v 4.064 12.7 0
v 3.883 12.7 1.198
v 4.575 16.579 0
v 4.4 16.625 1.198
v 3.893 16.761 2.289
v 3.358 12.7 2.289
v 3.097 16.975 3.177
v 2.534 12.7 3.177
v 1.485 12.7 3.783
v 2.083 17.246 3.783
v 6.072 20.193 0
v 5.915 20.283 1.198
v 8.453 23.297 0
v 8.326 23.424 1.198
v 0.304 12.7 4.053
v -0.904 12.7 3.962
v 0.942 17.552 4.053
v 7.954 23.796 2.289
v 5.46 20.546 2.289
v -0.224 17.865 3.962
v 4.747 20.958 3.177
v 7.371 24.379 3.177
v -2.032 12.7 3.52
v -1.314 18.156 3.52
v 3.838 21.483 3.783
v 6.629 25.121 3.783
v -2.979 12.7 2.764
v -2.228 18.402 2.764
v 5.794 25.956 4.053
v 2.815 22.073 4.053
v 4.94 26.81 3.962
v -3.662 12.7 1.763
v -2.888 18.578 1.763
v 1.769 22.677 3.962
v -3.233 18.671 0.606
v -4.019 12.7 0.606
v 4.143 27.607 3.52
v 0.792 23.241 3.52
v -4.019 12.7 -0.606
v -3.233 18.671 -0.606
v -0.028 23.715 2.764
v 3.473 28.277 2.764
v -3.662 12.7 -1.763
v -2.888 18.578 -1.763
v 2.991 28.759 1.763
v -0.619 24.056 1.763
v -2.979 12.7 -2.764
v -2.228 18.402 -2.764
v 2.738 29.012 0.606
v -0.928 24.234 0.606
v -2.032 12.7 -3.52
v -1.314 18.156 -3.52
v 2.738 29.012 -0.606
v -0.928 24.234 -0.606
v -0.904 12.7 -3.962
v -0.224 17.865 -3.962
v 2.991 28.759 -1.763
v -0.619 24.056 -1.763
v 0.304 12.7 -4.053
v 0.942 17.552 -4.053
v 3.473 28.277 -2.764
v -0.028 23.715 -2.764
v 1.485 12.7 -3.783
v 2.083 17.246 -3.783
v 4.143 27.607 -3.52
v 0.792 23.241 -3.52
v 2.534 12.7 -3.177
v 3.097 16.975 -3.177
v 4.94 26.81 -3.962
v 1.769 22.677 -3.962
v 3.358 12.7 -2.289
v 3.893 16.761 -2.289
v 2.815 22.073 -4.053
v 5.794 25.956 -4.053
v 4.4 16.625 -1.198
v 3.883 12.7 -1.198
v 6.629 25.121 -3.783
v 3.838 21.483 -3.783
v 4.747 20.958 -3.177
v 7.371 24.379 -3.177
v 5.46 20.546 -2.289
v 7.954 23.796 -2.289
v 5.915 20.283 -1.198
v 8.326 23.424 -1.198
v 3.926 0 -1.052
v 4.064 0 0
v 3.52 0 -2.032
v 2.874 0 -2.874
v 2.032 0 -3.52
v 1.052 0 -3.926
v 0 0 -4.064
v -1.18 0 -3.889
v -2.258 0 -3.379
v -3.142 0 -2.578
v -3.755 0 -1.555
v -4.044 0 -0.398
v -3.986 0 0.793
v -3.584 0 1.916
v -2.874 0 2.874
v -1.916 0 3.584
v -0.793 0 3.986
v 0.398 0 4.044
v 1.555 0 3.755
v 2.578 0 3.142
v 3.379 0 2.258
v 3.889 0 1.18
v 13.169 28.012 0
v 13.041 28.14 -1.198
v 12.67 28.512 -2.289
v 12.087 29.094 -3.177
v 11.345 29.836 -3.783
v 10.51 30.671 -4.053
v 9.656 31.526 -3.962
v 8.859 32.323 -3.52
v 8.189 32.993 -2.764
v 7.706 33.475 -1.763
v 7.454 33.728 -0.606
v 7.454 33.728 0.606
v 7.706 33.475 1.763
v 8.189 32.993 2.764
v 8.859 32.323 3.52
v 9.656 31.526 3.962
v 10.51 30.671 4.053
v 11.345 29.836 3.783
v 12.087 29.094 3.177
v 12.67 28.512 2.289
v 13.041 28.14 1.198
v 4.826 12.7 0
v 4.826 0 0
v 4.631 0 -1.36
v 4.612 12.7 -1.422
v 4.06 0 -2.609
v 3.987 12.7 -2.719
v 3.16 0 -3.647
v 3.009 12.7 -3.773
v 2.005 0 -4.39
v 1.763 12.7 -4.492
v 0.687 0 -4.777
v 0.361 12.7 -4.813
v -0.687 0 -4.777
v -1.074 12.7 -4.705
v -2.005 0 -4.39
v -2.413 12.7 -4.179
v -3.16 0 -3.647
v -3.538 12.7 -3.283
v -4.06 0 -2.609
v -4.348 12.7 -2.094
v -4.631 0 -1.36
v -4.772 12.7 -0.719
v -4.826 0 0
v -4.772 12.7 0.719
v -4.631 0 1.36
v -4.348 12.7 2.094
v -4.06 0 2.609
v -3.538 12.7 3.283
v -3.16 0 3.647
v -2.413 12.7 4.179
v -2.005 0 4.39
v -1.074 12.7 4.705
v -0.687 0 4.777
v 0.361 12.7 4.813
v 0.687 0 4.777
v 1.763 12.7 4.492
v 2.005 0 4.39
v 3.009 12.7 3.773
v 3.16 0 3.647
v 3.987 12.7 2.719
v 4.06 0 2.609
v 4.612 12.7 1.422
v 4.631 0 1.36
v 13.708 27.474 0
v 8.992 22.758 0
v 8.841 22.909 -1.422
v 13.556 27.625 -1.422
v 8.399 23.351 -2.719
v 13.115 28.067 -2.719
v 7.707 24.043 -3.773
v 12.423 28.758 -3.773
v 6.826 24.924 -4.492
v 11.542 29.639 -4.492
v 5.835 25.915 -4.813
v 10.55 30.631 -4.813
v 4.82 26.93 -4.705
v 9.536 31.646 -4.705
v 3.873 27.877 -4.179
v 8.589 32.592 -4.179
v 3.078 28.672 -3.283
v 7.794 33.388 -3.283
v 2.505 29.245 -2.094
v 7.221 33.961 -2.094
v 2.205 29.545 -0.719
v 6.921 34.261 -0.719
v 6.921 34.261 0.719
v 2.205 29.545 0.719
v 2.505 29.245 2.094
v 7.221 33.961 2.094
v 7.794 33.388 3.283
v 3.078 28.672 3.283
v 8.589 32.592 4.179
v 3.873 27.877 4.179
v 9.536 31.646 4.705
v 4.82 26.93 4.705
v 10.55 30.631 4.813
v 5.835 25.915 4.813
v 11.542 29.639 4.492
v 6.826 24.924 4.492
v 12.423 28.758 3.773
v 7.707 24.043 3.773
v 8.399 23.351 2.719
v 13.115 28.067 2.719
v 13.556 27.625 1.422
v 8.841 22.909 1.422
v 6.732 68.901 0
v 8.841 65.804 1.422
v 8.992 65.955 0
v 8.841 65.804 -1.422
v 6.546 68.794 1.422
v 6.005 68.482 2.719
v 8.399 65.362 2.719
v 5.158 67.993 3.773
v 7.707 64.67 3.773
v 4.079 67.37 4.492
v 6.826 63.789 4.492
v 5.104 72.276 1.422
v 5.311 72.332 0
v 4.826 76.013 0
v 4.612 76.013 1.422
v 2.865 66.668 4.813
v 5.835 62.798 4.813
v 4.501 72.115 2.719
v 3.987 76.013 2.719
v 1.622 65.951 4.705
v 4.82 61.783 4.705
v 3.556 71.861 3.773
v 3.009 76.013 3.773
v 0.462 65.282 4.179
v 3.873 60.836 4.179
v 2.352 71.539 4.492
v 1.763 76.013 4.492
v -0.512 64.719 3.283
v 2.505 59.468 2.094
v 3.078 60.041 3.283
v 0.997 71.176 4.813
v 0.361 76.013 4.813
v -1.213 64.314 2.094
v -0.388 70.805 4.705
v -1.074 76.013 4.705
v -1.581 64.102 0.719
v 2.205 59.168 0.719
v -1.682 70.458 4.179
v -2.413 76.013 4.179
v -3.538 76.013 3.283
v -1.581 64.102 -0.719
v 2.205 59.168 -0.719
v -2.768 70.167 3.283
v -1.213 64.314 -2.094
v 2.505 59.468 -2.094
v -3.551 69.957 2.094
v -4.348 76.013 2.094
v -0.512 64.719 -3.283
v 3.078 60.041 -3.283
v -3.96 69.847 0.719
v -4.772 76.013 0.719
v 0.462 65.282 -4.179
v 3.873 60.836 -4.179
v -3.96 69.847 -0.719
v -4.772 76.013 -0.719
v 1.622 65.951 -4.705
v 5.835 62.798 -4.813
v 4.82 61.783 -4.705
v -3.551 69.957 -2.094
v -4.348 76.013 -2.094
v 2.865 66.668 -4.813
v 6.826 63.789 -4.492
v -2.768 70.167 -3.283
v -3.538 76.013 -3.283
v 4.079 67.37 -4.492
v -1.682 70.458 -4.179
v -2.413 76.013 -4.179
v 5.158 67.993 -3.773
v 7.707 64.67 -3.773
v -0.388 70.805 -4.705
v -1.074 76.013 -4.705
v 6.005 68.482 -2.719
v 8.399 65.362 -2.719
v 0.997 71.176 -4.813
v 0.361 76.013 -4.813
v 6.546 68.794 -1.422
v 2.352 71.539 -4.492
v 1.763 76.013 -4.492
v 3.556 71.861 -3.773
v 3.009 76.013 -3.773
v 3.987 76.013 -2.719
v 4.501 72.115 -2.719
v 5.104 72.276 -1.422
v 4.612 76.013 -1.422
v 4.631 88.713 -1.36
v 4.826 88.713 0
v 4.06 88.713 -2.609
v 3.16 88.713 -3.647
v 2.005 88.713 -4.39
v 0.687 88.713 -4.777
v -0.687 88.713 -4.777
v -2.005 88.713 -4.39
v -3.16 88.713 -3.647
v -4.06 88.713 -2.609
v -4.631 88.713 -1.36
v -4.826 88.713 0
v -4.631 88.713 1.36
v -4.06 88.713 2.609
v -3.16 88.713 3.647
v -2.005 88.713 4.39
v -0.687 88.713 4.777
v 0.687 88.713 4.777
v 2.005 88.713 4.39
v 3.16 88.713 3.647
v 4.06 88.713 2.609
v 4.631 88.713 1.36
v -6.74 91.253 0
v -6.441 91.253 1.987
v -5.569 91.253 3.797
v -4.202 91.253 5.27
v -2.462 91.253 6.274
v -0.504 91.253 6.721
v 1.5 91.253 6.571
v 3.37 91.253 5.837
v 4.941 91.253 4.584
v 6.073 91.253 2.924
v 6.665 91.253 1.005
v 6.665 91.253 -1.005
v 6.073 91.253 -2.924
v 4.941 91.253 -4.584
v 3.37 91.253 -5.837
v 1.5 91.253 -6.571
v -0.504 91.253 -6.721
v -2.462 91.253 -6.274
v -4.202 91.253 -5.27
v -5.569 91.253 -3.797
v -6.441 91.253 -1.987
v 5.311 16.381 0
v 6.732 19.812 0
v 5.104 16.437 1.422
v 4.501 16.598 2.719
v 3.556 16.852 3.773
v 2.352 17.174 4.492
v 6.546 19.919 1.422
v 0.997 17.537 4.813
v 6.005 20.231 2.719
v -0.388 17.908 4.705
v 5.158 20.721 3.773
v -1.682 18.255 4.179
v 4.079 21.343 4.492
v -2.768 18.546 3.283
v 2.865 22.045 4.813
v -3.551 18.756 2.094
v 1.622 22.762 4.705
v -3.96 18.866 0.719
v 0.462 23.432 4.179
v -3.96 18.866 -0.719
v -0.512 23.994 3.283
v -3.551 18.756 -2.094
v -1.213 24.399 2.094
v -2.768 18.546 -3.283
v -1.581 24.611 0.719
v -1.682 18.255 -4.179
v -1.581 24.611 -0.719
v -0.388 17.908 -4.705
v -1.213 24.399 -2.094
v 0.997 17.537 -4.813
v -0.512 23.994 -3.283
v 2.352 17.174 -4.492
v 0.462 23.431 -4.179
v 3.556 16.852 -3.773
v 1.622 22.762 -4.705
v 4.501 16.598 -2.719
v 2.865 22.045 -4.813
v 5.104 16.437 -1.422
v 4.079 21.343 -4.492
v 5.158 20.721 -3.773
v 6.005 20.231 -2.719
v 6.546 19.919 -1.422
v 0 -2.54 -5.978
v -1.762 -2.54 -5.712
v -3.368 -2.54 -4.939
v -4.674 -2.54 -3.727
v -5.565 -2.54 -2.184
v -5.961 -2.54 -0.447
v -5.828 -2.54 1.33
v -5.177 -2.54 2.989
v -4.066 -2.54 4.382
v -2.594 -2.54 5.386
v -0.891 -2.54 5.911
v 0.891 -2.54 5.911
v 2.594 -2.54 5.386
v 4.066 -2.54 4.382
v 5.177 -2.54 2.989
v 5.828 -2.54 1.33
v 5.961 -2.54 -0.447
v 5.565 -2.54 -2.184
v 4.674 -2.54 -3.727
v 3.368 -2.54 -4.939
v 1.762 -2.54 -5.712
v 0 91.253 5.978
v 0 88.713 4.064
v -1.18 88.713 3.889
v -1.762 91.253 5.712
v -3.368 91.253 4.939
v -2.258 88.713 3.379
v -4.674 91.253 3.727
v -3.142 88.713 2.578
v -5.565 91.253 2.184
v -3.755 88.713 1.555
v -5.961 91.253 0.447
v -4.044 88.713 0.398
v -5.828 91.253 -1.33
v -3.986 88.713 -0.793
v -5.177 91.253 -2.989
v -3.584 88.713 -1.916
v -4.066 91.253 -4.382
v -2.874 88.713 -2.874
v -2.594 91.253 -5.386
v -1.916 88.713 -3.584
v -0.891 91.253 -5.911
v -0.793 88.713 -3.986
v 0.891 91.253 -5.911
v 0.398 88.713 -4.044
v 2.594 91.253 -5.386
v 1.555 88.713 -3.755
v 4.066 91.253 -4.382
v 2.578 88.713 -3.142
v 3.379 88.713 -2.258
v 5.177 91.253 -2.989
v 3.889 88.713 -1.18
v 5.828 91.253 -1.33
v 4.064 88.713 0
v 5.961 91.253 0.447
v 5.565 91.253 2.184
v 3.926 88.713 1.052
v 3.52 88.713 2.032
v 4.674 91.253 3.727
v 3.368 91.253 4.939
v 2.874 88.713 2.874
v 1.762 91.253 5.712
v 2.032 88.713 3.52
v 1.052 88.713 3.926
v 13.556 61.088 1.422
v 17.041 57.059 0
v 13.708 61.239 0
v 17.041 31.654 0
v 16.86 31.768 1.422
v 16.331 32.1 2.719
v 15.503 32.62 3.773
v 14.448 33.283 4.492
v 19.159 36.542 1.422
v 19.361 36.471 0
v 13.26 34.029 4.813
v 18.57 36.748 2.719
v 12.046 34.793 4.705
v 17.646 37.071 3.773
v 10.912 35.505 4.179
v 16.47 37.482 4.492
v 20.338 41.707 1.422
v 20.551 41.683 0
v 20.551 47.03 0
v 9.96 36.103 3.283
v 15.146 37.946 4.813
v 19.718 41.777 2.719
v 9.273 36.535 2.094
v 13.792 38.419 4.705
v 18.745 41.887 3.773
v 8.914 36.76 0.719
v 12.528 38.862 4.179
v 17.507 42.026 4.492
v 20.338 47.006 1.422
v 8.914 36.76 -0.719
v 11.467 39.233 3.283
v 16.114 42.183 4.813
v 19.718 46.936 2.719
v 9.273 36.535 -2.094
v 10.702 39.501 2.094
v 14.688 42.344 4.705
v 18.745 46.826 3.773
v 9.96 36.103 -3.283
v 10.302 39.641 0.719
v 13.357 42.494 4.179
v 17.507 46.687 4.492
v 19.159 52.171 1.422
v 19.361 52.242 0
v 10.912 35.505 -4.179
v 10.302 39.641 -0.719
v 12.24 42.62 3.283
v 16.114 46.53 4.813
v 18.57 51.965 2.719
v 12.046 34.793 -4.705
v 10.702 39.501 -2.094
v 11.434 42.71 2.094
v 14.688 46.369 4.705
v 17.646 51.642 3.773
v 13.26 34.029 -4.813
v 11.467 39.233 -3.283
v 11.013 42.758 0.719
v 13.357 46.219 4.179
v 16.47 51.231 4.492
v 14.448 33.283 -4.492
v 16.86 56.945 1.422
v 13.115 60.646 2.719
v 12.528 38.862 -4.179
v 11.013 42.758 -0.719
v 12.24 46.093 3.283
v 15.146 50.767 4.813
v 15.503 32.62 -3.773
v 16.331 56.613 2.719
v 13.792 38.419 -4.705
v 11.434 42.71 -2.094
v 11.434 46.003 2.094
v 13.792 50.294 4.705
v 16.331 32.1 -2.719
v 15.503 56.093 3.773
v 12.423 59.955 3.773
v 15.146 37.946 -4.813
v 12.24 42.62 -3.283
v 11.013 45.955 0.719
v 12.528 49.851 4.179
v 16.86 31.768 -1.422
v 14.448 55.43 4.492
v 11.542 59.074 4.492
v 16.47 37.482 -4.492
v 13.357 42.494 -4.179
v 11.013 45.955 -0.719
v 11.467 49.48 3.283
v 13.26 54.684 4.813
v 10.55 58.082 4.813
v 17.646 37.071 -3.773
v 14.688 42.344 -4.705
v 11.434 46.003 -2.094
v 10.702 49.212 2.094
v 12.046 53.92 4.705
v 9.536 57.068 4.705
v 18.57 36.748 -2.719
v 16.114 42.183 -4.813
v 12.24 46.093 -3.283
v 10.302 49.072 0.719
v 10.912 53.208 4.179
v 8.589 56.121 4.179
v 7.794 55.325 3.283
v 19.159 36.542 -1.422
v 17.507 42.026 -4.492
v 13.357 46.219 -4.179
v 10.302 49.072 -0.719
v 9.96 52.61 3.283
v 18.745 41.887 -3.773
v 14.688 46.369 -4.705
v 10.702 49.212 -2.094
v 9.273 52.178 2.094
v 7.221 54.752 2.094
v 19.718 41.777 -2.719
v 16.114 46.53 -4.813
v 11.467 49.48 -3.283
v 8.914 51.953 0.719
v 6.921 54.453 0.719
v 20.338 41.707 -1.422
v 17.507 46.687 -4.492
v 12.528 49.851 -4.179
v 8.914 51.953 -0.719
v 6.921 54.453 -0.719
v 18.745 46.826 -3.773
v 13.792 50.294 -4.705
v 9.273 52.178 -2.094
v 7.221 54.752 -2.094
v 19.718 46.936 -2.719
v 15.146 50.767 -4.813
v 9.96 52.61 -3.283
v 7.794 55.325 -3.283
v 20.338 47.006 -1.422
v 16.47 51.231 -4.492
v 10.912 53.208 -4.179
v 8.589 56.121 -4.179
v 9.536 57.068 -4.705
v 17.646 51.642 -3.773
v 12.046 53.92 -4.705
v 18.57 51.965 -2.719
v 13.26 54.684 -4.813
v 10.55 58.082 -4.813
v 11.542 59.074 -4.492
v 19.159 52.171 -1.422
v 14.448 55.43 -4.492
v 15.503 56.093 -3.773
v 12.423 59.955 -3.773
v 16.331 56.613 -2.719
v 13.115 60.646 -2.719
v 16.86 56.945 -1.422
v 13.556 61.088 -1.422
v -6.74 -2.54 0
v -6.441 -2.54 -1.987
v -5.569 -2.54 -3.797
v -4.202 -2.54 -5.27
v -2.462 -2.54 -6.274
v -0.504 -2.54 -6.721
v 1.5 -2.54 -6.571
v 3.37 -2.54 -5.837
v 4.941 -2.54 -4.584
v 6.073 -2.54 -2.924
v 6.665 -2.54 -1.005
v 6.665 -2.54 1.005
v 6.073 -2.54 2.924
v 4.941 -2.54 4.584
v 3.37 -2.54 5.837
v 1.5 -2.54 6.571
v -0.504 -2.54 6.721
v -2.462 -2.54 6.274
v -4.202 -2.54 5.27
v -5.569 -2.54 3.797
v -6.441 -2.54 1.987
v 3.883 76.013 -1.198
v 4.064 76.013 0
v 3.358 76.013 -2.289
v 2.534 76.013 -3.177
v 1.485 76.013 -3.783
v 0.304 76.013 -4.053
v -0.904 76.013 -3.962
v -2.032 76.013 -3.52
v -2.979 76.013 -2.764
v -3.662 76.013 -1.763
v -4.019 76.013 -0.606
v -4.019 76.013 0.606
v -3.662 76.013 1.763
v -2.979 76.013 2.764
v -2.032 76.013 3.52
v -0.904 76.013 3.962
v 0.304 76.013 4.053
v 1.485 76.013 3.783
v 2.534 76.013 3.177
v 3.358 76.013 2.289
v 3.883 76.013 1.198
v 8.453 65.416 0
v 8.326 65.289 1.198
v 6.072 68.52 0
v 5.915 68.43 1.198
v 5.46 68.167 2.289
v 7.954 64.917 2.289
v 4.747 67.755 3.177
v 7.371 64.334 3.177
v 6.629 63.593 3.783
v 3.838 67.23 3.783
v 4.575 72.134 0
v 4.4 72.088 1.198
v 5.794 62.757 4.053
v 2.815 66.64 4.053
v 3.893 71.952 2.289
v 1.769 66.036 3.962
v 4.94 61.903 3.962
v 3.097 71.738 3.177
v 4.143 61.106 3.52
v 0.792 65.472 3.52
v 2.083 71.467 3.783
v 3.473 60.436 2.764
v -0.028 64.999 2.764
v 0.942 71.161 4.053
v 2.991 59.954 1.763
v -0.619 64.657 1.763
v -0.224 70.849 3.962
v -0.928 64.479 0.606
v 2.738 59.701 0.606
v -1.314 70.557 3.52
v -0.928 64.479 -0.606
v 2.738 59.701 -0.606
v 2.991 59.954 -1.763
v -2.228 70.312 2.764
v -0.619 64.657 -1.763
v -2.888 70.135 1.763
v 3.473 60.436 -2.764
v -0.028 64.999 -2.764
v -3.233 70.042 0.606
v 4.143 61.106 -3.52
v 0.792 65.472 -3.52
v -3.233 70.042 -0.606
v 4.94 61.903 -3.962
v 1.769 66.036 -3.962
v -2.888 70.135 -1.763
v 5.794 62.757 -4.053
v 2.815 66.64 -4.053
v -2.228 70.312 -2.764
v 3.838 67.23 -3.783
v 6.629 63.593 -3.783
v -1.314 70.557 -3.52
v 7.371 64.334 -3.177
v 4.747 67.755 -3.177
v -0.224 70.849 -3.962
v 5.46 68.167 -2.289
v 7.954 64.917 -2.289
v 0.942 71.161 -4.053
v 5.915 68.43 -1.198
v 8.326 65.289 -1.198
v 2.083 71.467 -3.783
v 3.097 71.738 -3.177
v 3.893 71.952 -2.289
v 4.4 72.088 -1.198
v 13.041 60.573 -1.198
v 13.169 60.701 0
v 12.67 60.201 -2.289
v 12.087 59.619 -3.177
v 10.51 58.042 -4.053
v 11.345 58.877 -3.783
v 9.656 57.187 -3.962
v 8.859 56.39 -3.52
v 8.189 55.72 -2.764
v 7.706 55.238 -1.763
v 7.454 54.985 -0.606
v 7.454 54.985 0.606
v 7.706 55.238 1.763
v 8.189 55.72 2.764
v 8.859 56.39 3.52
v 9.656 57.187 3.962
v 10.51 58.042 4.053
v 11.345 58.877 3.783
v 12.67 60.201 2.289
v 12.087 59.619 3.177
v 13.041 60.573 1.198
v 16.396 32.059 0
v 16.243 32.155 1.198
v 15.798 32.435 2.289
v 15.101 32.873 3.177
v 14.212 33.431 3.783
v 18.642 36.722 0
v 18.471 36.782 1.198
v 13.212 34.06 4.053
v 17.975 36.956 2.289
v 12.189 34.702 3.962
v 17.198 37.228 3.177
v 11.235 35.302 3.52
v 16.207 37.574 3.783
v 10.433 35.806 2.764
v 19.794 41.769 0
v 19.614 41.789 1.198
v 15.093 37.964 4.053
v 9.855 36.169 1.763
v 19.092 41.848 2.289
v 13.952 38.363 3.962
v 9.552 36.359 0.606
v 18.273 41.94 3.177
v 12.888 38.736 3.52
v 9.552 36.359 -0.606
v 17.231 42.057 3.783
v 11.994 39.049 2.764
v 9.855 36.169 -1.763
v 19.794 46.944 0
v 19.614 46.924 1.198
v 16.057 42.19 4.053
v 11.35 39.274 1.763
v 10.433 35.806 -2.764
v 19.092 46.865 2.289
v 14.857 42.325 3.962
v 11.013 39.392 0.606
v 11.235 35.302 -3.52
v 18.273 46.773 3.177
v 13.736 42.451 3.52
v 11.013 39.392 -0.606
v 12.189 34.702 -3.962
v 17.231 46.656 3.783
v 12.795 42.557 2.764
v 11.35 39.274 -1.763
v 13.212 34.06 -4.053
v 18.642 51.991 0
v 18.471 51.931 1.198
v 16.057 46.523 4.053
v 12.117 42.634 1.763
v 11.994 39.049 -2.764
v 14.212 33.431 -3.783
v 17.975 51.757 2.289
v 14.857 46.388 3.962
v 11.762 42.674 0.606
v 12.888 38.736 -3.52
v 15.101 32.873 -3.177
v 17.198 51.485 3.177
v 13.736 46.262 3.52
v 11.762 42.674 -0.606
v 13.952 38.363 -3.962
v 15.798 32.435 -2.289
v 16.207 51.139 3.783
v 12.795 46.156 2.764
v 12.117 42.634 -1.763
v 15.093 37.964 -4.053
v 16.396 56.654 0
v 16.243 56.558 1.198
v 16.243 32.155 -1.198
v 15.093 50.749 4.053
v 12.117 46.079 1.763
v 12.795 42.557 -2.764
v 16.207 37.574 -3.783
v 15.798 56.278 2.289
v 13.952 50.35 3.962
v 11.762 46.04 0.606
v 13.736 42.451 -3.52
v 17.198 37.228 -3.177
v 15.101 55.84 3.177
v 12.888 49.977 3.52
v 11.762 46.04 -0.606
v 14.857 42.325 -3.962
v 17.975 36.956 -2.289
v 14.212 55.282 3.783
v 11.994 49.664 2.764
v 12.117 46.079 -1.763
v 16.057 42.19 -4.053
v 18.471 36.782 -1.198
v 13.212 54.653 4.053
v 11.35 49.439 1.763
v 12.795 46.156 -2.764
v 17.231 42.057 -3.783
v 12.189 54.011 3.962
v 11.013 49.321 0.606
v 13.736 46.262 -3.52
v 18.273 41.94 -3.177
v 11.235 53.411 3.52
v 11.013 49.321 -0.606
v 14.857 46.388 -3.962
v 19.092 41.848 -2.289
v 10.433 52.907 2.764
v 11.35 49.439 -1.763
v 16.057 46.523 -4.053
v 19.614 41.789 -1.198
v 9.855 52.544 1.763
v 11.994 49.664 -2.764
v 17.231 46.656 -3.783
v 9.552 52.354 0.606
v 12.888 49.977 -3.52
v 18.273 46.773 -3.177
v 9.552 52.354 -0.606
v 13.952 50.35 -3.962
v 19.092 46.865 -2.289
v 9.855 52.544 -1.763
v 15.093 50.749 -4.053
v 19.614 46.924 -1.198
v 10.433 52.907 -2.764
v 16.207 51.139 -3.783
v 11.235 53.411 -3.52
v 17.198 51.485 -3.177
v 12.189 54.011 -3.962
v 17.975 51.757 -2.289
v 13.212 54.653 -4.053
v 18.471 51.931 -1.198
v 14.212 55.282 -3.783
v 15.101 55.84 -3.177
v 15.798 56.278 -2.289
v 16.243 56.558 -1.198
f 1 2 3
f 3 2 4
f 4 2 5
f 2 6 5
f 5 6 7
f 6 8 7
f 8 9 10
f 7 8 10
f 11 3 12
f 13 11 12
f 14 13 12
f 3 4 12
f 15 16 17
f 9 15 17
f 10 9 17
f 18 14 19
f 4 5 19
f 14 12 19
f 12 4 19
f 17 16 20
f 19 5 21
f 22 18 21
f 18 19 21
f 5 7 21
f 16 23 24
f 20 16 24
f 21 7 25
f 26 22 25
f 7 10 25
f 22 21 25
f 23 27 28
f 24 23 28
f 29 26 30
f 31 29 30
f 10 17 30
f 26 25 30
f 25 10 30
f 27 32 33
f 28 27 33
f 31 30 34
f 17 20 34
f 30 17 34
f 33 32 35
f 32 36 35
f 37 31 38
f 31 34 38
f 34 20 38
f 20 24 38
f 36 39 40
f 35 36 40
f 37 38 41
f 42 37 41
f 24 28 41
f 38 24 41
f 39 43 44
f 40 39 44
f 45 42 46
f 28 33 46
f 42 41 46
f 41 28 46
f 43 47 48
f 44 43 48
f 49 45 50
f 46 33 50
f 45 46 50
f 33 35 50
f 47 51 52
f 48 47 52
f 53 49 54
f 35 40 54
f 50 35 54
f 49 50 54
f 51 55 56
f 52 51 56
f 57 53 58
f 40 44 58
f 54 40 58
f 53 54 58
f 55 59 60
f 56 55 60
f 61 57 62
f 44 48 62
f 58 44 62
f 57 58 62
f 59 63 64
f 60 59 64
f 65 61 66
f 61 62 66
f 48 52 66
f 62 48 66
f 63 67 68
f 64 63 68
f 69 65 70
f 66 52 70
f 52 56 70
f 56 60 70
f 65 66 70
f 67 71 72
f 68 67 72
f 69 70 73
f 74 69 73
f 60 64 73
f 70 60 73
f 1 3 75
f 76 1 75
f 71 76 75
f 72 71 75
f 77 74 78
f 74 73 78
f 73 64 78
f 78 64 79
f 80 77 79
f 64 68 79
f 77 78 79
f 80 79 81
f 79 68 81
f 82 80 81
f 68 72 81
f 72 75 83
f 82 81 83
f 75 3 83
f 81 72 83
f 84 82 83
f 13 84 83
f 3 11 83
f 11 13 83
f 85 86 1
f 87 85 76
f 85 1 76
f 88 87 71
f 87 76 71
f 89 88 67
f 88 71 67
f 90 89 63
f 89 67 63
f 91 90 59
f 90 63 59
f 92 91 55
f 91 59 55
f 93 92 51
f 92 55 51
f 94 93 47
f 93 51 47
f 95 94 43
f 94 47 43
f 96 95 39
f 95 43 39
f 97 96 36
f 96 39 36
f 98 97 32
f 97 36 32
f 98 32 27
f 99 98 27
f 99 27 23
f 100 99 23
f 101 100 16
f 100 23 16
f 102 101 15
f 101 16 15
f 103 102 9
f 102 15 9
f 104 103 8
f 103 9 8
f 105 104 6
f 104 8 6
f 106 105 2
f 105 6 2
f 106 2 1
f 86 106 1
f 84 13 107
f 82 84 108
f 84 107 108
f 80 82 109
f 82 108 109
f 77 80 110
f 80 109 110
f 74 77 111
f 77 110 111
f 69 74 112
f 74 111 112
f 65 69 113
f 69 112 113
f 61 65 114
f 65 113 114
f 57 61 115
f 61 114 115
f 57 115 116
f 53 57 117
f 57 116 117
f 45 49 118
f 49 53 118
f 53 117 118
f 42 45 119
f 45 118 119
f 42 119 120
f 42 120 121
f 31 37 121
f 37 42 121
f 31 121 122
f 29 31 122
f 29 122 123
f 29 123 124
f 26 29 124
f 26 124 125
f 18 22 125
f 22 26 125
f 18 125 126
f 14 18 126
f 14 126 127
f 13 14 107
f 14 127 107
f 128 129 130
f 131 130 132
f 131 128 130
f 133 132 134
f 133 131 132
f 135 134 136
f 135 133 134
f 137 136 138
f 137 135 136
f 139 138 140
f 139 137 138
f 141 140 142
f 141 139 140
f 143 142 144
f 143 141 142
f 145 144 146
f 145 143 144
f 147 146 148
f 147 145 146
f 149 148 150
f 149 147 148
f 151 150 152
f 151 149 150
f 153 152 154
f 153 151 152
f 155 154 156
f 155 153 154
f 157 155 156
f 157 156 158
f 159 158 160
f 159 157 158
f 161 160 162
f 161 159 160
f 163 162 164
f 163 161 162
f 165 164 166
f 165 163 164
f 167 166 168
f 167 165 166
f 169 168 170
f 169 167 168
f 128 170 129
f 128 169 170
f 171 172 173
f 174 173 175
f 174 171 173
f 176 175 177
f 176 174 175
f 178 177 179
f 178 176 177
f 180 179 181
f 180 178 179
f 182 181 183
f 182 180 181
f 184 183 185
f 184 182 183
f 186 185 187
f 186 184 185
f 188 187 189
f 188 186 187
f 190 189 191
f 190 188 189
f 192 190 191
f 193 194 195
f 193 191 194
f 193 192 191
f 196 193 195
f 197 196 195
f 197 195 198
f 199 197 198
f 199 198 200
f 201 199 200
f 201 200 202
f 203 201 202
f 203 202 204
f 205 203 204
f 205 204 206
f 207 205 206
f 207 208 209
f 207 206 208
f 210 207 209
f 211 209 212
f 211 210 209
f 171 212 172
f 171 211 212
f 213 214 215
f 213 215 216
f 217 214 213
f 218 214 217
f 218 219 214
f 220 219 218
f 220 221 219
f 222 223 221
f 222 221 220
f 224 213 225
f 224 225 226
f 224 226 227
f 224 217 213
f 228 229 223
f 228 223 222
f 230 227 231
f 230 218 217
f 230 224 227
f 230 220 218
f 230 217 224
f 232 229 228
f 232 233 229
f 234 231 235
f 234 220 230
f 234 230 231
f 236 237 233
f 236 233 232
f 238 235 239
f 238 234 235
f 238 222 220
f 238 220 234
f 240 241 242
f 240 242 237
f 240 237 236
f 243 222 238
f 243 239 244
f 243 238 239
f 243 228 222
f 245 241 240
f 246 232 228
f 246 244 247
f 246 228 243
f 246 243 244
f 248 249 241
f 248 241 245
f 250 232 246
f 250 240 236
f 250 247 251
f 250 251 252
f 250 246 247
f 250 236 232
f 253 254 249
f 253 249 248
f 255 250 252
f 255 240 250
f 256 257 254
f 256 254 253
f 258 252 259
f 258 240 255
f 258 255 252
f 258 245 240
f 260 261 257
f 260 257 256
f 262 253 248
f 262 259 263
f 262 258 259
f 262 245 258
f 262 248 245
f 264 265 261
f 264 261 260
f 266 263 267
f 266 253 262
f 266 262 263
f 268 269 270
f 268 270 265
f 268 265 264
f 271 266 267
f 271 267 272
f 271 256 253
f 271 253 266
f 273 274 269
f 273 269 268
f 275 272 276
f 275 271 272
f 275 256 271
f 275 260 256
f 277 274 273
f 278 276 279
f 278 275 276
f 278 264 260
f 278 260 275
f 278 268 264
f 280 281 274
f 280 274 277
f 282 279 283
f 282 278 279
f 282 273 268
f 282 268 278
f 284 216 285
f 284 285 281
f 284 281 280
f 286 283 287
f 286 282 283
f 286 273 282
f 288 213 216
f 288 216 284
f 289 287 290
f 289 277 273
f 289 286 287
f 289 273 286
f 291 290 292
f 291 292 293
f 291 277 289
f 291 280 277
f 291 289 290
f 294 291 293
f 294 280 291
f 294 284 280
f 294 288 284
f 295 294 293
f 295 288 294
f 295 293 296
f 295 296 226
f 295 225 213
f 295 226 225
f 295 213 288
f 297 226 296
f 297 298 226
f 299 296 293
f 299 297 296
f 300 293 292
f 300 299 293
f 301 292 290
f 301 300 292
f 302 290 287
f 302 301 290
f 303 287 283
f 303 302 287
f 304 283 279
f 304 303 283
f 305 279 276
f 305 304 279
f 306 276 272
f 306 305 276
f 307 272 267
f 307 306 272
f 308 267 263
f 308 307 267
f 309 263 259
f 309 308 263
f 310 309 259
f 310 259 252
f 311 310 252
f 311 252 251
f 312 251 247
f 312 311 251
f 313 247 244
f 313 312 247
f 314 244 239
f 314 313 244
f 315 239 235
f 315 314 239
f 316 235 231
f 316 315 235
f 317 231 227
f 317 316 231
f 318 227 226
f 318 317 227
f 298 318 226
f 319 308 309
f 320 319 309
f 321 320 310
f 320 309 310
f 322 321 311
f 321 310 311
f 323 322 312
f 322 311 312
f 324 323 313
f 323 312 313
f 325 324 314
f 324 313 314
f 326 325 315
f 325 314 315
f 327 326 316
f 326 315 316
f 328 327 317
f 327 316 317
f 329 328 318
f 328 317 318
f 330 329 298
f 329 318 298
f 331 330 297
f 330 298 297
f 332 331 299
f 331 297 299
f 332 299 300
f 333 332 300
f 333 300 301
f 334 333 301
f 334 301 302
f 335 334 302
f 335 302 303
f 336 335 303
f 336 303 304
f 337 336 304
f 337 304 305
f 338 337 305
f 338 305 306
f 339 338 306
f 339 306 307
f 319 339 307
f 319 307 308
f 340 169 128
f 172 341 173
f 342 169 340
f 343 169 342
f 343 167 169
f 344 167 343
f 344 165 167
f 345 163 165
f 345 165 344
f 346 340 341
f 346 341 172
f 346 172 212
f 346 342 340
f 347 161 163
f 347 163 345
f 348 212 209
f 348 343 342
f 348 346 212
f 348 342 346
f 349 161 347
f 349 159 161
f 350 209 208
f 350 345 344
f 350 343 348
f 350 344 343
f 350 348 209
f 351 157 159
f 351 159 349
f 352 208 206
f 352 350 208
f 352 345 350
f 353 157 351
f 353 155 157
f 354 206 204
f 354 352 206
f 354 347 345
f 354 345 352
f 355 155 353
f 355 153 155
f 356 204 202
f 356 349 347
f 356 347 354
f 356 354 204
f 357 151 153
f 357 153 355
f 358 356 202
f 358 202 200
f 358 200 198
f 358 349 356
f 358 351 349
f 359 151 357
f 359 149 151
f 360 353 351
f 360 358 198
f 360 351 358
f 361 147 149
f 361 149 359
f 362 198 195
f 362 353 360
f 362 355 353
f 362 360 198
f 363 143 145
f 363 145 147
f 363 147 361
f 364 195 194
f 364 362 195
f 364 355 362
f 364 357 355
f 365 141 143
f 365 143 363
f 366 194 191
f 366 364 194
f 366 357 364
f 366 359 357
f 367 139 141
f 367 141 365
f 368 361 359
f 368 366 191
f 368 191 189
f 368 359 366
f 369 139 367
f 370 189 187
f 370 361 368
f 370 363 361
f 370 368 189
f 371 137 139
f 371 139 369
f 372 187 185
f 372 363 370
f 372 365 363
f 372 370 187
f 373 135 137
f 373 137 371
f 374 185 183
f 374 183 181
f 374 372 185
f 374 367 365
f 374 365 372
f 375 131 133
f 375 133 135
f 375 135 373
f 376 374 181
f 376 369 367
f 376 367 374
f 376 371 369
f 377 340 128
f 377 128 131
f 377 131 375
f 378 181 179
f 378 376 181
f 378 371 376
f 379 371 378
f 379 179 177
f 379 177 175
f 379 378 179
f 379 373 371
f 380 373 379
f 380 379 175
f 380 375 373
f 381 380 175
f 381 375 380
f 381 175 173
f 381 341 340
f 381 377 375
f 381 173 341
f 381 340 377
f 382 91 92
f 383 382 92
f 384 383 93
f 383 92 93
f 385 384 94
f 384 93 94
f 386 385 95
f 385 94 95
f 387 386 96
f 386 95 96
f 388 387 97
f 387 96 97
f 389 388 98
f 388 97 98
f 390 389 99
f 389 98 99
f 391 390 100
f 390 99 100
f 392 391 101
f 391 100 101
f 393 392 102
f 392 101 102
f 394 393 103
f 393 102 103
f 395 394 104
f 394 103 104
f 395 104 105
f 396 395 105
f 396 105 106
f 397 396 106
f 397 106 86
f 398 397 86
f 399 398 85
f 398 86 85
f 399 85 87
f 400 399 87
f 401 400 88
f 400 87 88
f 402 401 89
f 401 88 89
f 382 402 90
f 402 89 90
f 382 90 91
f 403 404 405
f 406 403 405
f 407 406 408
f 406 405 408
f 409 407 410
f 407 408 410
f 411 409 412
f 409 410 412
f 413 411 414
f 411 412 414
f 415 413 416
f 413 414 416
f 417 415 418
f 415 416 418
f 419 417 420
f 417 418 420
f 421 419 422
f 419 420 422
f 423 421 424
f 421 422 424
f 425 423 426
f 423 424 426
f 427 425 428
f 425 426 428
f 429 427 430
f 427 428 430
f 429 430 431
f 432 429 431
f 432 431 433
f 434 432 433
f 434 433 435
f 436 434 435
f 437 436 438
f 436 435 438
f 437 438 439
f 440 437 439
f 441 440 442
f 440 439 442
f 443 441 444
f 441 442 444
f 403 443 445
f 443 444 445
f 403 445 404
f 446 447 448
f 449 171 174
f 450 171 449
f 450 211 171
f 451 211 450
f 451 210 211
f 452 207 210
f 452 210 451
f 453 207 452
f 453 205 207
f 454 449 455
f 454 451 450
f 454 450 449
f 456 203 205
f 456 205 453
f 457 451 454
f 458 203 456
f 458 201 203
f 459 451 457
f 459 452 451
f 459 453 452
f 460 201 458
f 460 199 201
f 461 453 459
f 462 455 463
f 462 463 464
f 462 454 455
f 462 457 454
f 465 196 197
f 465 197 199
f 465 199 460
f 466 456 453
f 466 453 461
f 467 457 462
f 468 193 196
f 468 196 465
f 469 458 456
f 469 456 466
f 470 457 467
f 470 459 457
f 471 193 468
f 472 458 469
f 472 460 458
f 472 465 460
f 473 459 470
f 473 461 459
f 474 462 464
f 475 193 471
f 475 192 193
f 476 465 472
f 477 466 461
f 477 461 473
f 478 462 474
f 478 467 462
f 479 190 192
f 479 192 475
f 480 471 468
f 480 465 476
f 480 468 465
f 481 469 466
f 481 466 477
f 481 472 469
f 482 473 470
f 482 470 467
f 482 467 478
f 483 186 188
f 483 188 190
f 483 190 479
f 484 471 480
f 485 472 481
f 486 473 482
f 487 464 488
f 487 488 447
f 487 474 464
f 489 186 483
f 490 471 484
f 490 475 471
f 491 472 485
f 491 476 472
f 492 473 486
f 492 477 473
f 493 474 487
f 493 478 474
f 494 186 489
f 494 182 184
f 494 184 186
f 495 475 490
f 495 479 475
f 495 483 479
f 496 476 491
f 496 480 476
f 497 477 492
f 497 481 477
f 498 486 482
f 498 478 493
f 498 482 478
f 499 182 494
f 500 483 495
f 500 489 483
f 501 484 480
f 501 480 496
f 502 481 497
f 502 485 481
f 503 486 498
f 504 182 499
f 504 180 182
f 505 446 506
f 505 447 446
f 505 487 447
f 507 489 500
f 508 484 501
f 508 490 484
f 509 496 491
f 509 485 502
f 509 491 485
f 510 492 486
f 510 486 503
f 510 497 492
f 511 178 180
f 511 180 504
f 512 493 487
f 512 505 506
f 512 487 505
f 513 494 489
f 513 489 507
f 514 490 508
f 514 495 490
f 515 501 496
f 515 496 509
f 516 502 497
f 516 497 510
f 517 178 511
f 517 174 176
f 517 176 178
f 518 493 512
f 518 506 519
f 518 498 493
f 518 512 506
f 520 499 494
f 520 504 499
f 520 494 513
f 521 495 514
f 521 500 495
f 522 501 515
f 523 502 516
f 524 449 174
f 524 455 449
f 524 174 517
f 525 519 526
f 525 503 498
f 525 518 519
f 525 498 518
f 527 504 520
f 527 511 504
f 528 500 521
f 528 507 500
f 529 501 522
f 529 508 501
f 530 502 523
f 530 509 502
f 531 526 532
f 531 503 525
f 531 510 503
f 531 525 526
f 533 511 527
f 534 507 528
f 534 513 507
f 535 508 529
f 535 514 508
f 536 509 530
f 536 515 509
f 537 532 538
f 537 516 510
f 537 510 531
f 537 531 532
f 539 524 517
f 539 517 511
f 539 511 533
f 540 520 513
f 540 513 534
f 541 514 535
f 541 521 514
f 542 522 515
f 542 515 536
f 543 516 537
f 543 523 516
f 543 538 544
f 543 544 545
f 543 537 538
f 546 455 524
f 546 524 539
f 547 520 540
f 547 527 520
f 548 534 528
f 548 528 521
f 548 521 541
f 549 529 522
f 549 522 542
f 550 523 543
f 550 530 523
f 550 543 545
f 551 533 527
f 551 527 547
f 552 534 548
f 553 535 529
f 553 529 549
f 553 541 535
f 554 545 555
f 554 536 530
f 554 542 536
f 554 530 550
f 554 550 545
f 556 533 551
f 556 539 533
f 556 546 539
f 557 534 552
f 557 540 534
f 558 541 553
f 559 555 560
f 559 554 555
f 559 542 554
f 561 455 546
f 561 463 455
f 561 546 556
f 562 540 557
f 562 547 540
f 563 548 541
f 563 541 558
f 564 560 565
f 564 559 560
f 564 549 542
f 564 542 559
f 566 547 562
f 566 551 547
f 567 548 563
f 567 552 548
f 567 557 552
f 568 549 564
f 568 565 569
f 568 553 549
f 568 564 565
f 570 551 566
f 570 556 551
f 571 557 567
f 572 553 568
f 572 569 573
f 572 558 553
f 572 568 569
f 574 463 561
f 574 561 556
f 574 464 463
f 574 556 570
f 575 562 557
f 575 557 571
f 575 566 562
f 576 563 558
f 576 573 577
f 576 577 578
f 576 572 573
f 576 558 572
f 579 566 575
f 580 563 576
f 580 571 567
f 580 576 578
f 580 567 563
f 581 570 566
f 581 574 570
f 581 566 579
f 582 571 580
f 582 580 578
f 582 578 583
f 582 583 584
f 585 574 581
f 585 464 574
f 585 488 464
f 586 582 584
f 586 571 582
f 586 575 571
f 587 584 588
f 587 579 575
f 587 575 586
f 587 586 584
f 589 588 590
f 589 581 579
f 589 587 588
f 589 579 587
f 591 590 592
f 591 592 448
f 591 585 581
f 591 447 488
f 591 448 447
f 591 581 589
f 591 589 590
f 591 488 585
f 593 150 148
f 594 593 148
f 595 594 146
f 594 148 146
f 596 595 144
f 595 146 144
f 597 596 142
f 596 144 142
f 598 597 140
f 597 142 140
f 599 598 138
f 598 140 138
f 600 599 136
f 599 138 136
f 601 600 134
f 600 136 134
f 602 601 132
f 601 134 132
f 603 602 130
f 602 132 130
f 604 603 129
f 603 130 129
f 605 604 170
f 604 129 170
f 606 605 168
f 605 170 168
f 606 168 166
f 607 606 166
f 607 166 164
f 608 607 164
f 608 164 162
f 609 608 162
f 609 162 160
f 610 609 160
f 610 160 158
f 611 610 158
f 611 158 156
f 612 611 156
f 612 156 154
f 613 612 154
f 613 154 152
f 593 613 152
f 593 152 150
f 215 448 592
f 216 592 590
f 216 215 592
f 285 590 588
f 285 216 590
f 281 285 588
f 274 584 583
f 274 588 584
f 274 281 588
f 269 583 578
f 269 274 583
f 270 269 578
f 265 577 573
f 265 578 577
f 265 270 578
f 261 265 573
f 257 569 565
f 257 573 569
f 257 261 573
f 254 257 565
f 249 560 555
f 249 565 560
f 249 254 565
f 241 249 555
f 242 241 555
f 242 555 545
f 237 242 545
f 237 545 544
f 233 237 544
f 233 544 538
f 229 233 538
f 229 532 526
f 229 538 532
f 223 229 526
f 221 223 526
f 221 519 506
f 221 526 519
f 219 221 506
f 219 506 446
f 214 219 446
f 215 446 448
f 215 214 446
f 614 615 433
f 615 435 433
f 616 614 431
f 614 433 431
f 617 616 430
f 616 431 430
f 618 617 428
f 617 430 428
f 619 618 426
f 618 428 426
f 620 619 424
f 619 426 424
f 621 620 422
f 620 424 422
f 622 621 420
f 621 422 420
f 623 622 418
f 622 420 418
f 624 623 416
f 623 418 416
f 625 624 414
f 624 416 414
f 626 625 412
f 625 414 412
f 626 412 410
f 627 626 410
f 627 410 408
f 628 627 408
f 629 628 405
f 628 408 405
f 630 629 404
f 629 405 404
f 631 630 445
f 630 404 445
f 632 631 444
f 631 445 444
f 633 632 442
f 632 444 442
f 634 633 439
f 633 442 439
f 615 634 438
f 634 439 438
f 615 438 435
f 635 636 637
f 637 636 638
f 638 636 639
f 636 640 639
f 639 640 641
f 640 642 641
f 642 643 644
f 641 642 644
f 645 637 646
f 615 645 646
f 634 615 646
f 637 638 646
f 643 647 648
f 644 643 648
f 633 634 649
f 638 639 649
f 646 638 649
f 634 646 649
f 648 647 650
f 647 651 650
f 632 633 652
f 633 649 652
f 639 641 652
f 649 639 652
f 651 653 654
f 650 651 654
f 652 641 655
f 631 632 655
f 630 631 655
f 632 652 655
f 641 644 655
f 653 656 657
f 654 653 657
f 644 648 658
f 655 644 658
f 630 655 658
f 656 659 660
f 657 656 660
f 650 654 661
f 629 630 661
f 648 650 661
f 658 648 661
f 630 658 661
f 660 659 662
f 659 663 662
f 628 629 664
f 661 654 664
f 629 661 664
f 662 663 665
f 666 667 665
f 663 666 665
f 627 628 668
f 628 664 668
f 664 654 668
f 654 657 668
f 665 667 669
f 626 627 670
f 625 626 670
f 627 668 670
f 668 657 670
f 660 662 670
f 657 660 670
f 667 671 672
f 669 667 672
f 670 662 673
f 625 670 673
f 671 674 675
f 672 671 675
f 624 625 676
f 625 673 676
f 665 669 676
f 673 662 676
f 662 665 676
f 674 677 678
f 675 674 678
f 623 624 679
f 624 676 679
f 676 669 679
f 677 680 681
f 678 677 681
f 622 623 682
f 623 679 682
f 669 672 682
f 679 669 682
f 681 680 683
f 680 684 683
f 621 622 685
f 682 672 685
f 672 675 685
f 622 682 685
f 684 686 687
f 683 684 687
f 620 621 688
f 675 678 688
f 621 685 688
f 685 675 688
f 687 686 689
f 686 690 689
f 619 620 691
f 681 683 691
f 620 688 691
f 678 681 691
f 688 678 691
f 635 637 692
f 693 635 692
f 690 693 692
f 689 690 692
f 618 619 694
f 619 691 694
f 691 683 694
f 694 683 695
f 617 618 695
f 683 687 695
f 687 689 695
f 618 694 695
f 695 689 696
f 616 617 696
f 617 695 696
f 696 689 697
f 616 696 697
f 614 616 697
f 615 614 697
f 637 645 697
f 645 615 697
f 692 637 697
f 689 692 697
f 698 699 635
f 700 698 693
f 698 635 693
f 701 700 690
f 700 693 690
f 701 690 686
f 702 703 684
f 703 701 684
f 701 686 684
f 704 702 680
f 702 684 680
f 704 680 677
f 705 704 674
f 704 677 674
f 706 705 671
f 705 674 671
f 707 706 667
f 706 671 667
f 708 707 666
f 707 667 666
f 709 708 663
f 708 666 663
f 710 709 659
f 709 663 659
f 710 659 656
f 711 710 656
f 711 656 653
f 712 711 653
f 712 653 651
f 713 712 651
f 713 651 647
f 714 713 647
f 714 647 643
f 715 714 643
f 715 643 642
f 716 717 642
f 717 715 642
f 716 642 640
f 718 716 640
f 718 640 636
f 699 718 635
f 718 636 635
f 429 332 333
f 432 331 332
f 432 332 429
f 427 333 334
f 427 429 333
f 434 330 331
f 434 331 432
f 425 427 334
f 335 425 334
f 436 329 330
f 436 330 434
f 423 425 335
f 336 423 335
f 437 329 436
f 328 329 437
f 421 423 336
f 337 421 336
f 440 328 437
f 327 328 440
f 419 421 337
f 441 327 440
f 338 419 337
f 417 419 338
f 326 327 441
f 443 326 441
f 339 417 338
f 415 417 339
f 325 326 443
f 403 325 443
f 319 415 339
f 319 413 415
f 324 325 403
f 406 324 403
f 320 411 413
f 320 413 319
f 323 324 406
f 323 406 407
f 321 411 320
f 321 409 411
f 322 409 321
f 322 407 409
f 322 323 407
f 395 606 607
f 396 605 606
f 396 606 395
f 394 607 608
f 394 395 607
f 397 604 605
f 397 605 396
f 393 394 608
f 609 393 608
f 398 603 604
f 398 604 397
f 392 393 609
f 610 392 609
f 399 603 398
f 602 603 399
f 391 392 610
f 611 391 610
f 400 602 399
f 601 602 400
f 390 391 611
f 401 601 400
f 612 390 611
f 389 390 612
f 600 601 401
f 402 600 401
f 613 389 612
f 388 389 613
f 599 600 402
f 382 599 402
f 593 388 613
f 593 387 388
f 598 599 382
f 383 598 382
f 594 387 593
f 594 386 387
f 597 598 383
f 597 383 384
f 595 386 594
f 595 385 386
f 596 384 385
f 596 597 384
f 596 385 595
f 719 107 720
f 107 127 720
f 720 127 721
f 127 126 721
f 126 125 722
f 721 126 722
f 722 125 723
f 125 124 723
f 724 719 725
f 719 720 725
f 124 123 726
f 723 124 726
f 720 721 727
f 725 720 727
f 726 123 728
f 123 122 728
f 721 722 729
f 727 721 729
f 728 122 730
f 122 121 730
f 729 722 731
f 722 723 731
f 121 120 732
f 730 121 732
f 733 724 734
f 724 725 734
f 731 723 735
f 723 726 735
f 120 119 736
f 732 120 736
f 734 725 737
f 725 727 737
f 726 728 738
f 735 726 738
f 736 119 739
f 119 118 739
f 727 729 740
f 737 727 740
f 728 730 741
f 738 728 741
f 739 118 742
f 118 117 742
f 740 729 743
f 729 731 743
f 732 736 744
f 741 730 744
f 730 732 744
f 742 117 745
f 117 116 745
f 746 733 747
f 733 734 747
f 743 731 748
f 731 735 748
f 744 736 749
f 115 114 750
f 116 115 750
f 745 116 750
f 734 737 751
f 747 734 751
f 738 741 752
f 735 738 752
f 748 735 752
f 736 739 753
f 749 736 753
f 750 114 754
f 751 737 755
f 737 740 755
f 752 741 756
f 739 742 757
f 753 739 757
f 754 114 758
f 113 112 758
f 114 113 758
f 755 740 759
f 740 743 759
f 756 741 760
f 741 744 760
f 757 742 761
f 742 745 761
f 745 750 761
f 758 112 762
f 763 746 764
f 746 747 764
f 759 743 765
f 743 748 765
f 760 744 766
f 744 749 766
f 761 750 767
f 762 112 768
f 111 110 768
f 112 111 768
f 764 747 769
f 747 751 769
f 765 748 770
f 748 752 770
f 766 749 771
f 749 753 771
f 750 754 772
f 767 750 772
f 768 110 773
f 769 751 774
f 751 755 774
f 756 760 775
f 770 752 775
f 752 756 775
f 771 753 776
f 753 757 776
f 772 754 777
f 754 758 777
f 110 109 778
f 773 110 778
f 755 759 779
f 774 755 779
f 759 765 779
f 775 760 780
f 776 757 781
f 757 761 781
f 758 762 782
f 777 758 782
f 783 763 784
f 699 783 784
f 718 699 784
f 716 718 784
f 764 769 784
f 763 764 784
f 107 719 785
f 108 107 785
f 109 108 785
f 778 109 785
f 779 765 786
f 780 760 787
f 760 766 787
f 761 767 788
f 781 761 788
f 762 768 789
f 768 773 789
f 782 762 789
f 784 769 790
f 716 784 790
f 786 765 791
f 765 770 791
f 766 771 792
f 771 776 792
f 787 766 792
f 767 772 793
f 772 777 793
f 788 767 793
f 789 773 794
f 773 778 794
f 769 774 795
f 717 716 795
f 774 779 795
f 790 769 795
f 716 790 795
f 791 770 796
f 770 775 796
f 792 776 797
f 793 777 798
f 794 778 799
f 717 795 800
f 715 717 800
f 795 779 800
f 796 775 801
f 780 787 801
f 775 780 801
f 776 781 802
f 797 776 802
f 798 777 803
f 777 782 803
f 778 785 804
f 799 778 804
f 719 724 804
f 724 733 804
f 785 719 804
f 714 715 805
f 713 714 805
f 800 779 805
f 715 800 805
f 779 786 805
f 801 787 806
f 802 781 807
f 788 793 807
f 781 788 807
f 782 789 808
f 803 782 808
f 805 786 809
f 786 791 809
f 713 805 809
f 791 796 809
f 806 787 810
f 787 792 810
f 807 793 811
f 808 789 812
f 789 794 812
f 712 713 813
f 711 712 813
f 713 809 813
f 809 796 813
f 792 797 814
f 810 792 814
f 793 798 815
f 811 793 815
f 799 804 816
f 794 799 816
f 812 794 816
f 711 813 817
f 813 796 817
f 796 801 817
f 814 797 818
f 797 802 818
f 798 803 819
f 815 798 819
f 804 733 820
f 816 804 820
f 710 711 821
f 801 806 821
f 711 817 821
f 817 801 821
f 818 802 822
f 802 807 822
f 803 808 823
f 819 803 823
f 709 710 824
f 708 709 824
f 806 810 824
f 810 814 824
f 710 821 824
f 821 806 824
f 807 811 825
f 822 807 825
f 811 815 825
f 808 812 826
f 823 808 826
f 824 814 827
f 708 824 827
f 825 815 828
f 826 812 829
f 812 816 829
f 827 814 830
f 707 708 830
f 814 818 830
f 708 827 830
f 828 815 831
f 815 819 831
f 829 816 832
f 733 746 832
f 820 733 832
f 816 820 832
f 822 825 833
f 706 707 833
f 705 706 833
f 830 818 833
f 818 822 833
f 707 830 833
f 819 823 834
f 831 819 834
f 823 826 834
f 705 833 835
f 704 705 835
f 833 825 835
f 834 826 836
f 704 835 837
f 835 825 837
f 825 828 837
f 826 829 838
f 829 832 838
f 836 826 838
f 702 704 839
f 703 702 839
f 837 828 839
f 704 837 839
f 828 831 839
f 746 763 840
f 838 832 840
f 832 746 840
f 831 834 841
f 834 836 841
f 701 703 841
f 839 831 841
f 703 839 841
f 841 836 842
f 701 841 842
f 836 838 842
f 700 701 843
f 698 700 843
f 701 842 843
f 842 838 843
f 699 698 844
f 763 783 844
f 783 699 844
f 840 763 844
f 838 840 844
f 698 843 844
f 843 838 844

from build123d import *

# Parameters (mm, degrees)
SKETCH1_R           = 4.826
SKETCH1_R_2         = 4.064
SKETCH3_R           = 4.826
BOSS_EXTRUDE1_DEPTH = 2.54
BOSS_EXTRUDE1_DRAFT = -37
SKETCH5_R           = 4.826
BOSS_EXTRUDE2_DEPTH = 2.54
BOSS_EXTRUDE2_DRAFT = -37


with BuildPart() as part:
    # Sweep1: sweep along a path in Sketch2
    with BuildLine(Plane.XY) as sweep1_path:
        Line((0, 0), (0, 12.7))
        ThreePointArc((0, 12.7), (1.450094906, 19.990119387), (5.579615818, 26.170384182))
        Line((5.579615818, 26.170384182), (10.295384182, 30.886152545))
        ThreePointArc((10.295384182, 30.886152545), (15.875, 44.356536726), (10.295384182, 57.826920908))
        Line((10.295384182, 57.826920908), (5.579615818, 62.542689271))
        ThreePointArc((5.579615818, 62.542689271), (1.450094906, 68.722954066), (0, 76.013073453))
        Line((0, 76.013073453), (0, 88.713073453))
    # Sketch1 → Sweep1 (sweep)
    with BuildSketch(Plane(origin=(0, 0, 0), x_dir=(1, 0, 0), z_dir=(0, 1, 0))):
        Circle(SKETCH1_R)
        Circle(SKETCH1_R_2, mode=Mode.SUBTRACT)
    sweep(path=sweep1_path.line)


with BuildPart() as boss_extrude1_tool:
    # Sketch3 → Boss-Extrude1 (with draft: the straight prism first)
    with BuildSketch(Plane.XZ):
        with Locations(Location((0, 0, 0), (0, 0, 180))):
            Circle(SKETCH3_R)
    extrude(amount=BOSS_EXTRUDE1_DEPTH)
    # Boss-Extrude1: the draft: its side faces are tilted about the plane it starts from
    boss_extrude1_sides = [boss_extrude1_tool.faces().sort_by_distance(p)[0] for p in [
        (4.826, -1.27, 0),
    ]]
    draft(boss_extrude1_sides, Plane.XZ, BOSS_EXTRUDE1_DRAFT)


with BuildPart() as part_1:
    add(part.part)

    # Boss-Extrude1: add boss_extrude1_tool
    add(boss_extrude1_tool.part)

    # Cut-Extrude1 cone 1 section (through the dimple's axis) → Cut-Extrude1 (revolve, cut)
    with BuildSketch(Plane(origin=(0, -2.54, 0), x_dir=(0, 0, -1), z_dir=(1, 0, 0))):
        Polygon((0, 0), (5.978027287, 0), (0, 7.933110155), align=None)
    revolve(axis=Axis((0, -2.54, 0), (0, 1, 0)), mode=Mode.SUBTRACT)


with BuildPart() as boss_extrude2_tool:
    # Sketch5 → Boss-Extrude2 (with draft: the straight prism first)
    with BuildSketch(Plane(origin=(0, 88.713073453, 0), x_dir=(0, 0, -1), z_dir=(0, 1, 0))):
        with Locations(Location((0, 0, 0), (0, 0, 90))):
            Circle(SKETCH5_R)
    extrude(amount=BOSS_EXTRUDE2_DEPTH)
    # Boss-Extrude2: the draft: its side faces are tilted about the plane it starts from
    boss_extrude2_sides = [boss_extrude2_tool.faces().sort_by_distance(p)[0] for p in [
        (4.826, 89.983073453, 0),
    ]]
    draft(boss_extrude2_sides, Plane(origin=(0, 88.713073453, 0), x_dir=(0, 0, -1), z_dir=(0, 1, 0)), BOSS_EXTRUDE2_DRAFT)


with BuildPart() as part_2:
    add(part_1.part)

    # Boss-Extrude2: add boss_extrude2_tool
    add(boss_extrude2_tool.part)

    # Cut-Extrude2 cone 1 section (through the dimple's axis) → Cut-Extrude2 (revolve, cut)
    with BuildSketch(Plane(origin=(0, 91.253073453, 0), x_dir=(0, 0, 1), z_dir=(1, 0, 0))):
        Polygon((0, 0), (5.978027287, 0), (0, 7.933110155), align=None)
    revolve(axis=Axis((0, 91.253073453, 0), (0, -1, 0)), mode=Mode.SUBTRACT)


solid = part_2.part
